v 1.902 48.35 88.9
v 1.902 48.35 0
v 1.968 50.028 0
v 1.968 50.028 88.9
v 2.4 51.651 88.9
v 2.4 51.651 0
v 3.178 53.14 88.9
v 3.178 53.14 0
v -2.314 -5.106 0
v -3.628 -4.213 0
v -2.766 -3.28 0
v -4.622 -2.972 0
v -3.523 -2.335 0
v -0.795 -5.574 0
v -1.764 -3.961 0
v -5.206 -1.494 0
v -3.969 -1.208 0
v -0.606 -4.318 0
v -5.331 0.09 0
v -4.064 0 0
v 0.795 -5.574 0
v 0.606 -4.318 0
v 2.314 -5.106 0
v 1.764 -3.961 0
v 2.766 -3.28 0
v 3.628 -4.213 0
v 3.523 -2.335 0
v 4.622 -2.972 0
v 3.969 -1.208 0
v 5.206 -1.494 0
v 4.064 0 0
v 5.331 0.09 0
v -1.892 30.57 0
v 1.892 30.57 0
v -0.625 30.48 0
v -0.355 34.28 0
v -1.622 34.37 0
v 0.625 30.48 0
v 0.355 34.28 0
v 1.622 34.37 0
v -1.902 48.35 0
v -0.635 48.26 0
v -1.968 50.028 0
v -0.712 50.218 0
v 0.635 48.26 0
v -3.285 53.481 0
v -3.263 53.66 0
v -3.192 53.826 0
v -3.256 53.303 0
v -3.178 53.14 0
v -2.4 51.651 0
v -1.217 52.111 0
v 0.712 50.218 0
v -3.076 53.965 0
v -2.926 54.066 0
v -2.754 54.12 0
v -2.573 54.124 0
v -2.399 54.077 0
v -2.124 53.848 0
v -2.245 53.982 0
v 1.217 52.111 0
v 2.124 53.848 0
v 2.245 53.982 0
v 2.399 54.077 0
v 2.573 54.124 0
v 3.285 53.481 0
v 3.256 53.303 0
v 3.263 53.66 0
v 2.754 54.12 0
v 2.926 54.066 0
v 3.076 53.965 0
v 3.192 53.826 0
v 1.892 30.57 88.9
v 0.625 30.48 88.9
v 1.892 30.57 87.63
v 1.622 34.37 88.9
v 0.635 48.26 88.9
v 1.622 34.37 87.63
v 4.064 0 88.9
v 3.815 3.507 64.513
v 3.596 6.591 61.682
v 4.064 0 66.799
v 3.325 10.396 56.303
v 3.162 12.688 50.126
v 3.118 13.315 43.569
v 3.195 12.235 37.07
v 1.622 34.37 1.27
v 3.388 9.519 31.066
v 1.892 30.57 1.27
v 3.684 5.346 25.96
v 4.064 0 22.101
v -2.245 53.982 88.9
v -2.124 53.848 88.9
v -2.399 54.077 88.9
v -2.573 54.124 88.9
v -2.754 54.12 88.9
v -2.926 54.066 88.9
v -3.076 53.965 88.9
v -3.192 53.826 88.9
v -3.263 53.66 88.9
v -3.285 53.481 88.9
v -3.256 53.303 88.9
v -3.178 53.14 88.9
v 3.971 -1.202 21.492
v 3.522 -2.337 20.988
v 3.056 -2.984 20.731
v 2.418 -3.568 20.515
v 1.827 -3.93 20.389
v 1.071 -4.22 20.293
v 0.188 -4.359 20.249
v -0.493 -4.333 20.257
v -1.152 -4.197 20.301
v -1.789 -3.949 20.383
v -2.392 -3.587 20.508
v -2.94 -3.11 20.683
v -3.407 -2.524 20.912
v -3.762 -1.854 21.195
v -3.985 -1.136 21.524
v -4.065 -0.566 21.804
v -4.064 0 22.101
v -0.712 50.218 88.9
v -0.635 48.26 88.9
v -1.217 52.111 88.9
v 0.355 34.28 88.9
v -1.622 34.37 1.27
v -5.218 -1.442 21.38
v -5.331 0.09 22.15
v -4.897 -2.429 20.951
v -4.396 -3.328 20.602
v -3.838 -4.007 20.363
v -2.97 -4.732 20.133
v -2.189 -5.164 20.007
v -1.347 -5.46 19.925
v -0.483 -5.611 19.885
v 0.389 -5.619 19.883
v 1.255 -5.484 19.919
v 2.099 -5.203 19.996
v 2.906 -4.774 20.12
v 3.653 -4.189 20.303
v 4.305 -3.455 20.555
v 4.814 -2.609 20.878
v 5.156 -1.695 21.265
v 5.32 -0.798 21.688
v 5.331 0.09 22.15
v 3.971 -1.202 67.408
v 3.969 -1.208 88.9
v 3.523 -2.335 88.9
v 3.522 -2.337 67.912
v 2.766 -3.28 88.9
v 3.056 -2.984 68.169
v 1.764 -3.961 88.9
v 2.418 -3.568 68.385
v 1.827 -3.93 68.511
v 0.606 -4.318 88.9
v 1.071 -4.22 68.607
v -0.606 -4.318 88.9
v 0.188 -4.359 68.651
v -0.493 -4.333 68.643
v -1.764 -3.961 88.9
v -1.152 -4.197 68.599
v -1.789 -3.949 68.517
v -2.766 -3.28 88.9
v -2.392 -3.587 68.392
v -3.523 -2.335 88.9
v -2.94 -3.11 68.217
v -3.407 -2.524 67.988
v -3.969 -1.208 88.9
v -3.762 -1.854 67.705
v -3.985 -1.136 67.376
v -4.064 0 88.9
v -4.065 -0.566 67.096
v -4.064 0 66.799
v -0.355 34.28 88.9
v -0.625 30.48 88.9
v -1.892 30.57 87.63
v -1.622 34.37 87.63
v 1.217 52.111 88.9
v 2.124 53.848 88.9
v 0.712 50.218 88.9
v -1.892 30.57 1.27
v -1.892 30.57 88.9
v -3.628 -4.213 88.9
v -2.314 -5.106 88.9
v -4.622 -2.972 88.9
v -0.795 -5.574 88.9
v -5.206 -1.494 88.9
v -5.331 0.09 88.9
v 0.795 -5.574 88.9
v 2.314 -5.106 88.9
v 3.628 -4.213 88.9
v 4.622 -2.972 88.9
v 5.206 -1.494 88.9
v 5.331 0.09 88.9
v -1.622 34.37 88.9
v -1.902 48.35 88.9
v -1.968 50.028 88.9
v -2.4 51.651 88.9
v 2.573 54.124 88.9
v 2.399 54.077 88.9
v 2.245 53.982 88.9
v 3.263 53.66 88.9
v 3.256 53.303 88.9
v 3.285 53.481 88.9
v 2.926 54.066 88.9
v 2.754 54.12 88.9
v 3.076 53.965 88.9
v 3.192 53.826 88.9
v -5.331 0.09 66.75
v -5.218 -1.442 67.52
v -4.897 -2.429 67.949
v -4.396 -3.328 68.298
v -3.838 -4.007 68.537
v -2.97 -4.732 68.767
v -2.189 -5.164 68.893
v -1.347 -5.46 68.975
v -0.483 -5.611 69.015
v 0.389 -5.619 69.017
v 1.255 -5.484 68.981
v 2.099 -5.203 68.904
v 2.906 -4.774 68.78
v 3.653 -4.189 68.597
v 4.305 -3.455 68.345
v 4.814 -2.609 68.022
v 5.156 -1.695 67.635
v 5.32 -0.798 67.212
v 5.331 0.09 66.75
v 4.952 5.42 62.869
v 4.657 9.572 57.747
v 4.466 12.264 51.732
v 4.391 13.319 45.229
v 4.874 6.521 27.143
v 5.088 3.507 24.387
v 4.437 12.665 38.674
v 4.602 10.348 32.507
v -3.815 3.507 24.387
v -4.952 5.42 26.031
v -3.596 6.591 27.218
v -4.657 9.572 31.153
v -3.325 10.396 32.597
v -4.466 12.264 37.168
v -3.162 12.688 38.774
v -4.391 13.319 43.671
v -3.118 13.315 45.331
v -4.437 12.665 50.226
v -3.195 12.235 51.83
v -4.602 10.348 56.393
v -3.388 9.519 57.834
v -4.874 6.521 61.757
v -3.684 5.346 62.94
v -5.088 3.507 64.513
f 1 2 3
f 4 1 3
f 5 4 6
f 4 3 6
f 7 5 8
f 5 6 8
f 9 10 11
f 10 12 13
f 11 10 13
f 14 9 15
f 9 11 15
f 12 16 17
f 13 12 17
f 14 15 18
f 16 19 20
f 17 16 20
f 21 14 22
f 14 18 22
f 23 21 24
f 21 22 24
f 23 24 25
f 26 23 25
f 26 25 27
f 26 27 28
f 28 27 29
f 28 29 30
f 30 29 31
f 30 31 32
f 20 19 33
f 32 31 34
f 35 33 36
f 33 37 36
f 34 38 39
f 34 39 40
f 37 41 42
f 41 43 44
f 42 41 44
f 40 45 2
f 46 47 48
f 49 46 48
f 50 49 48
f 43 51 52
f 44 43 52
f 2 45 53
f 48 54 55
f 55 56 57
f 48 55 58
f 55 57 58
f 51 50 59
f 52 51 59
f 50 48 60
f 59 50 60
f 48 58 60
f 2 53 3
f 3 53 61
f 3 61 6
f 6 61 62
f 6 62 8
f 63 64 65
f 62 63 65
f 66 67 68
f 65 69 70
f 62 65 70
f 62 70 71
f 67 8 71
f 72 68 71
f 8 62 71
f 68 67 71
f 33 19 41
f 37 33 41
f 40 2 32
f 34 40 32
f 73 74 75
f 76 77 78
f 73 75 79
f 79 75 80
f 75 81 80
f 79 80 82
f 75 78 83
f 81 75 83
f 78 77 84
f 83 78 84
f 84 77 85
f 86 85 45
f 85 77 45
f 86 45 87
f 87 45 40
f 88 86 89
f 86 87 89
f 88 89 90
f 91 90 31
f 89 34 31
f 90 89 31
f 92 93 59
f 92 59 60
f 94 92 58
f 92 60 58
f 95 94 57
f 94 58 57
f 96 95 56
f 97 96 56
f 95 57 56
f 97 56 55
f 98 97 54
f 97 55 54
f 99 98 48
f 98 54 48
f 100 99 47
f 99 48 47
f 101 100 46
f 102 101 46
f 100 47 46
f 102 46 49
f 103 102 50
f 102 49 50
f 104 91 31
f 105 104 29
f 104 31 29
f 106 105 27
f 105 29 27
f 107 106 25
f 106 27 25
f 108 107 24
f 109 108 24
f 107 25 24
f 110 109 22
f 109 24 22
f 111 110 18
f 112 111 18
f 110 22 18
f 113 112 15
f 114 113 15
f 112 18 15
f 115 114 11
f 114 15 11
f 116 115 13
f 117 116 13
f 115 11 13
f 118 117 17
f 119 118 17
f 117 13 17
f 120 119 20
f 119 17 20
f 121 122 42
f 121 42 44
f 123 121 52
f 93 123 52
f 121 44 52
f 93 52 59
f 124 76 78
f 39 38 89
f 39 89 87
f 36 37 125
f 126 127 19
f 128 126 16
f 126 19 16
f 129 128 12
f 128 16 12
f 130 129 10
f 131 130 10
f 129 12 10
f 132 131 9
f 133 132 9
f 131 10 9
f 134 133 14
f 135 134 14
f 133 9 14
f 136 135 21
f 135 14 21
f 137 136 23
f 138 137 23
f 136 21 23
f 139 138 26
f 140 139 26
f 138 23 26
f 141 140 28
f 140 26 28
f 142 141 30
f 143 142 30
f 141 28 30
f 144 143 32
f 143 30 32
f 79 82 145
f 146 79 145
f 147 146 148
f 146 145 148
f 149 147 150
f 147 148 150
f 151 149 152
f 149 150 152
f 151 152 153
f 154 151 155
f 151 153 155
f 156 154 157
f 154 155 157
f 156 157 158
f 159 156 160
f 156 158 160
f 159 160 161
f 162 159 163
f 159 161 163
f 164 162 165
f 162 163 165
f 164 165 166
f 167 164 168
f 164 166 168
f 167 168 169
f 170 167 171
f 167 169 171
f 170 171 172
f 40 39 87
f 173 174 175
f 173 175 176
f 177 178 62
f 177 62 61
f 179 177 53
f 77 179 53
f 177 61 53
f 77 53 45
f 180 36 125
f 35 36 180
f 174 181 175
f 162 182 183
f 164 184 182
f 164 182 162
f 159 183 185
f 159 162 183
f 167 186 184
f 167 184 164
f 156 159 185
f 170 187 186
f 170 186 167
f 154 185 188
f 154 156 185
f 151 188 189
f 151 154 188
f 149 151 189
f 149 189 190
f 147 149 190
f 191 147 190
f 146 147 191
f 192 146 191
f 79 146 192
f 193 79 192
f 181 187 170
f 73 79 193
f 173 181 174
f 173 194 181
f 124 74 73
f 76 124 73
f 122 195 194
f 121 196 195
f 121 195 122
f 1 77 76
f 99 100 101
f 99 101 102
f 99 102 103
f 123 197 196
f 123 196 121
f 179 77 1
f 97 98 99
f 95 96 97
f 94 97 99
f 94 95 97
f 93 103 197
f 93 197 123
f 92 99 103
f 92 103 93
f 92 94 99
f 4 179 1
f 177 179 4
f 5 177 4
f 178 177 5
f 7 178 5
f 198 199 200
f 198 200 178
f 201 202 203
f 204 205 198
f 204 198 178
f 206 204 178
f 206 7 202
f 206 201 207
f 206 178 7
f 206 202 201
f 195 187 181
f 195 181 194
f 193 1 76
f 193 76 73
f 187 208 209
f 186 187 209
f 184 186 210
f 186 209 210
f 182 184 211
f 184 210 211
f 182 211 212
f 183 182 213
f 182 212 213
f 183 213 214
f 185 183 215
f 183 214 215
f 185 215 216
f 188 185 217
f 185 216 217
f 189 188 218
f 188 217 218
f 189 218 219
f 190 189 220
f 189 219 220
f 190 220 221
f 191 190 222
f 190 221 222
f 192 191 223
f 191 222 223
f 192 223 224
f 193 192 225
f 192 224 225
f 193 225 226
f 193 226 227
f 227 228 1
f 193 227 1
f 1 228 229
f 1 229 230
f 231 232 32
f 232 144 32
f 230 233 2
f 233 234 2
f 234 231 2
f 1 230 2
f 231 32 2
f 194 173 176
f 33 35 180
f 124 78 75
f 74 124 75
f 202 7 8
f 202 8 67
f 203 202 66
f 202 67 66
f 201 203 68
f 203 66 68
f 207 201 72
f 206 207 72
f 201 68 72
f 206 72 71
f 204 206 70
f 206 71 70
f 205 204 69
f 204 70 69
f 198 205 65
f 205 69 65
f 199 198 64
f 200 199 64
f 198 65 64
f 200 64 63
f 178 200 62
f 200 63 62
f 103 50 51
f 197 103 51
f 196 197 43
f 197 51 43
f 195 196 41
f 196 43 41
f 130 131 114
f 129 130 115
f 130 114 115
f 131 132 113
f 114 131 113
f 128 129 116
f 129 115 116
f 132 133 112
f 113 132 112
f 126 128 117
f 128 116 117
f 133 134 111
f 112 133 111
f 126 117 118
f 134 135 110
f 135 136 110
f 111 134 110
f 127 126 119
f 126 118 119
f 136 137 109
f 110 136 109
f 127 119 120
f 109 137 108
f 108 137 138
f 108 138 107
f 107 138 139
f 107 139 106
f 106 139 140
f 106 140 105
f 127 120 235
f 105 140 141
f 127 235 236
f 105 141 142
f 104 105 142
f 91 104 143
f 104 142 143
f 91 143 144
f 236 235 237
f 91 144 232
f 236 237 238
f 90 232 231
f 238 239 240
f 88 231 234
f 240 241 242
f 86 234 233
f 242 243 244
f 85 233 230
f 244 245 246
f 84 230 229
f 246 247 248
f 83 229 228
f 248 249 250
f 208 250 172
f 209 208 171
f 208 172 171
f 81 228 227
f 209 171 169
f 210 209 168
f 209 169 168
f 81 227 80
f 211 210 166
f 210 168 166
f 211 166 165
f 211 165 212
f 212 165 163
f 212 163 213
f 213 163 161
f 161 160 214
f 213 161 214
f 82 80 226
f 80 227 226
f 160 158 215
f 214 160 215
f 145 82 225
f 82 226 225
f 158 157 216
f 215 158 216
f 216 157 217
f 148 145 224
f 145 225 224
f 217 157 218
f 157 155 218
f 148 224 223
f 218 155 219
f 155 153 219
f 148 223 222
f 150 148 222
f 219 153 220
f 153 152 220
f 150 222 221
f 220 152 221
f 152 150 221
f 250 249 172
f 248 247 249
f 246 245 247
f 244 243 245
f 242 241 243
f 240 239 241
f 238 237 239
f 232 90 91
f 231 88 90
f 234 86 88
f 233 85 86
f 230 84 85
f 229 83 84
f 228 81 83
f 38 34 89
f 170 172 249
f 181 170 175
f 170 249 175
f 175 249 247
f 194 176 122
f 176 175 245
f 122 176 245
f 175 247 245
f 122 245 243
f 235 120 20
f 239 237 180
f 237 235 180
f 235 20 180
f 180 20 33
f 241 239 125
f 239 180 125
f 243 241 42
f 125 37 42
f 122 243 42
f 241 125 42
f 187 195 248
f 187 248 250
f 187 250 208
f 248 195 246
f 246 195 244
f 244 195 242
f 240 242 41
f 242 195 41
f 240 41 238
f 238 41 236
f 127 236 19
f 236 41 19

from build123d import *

# Parameters (mm, degrees)
F1_DEPTH = 88.9
F3_DEPTH = 1.27
F5_DEPTH = 1.27
F6_SIZE  = 1.26999
F8_DEPTH = 12.7


# Not quite as in the source:
# - a fillet or chamfer is up to 0.001 mm smaller than in the source, because OpenCascade refuses the exact size


with BuildPart() as f1:
    # F0 (on Top) → F1 (new body)
    with BuildSketch(Plane.XY):
        with BuildLine():
            Line((-4.064, 0), (-0.635, 48.26))
            ThreePointArc((-0.635, 48.26), (-0.9122099758, 51.1784184141), (-2.1235503767, 53.848))
            ThreePointArc((-2.1235503767, 53.848), (-3.0047663986, 54.0209402292), (-3.1777066278, 53.1397242074))
            ThreePointArc((-3.1777066278, 53.1397242074), (-2.1394148555, 50.8515114195), (-1.9018063048, 48.3500099217))
            Line((-1.9018063048, 48.3500099217), (-5.3308063048, 0.0900099217))
            ThreePointArc((-5.3308063048, 0.0900099217), (0, -5.633003484), (5.3308063048, 0.0900099217))
            Line((5.3308063048, 0.0900099217), (1.9018063048, 48.3500099217))
            ThreePointArc((1.9018063048, 48.3500099217), (2.1394148555, 50.8515114195), (3.1777066278, 53.1397242074))
            ThreePointArc((3.1777066278, 53.1397242074), (3.0047663986, 54.0209402292), (2.1235503767, 53.848))
            ThreePointArc((2.1235503767, 53.848), (0.9122099758, 51.1784184141), (0.635, 48.26))
            Line((0.635, 48.26), (4.064, 0))
            ThreePointArc((4.064, 0), (0, -4.363003484), (-4.064, 0))
        make_face()
    extrude(amount=F1_DEPTH)

    # F2 (on face) → F3 (join)
    with BuildSketch(Plane.XY.offset(88.9)):
        Polygon((-0.3550842778, 34.2804189145), (-1.6218905827, 34.3704288362), (-1.8919203477, 30.5700099217), (-0.6251140428, 30.48), align=None)
        Polygon((0.6251140428, 30.48), (1.8919203477, 30.5700099217), (1.6218905827, 34.3704288362), (0.3550842778, 34.2804189145), align=None)
    extrude(amount=-F3_DEPTH)

    # F4 (on face) → F5 (join)
    with BuildSketch(Plane(origin=(0, 0, 0), x_dir=(1, 0, 0), z_dir=(0, 0, -1))):
        Polygon((-0.6251140428, -30.48), (-1.8919203477, -30.5700099217), (-1.6218905827, -34.3704288362), (-0.3550842778, -34.2804189145), align=None)
        Polygon((1.6218905827, -34.3704288362), (1.8919203477, -30.5700099217), (0.6251140428, -30.48), (0.3550842778, -34.2804189145), align=None)
    extrude(amount=-F5_DEPTH)

    # F6 (size 1.27 in the source; OpenCascade refuses exactly that, so slightly less here)
    f6_edges = [f1.edges().sort_by_distance(p)[0] for p in [
        (-0.490099, 32.380209, 1.27),
        (0.490099, 32.380209, 1.27),
        (-0.490099, 32.380209, 87.63),
        (0.490099, 32.380209, 87.63),
    ]]
    chamfer(f6_edges, length=F6_SIZE)

    # F7 (on Right) → F8 (cut, symmetric)
    with BuildSketch(Plane.YZ):
        with BuildLine():
            ThreePointArc((-5.842, 19.8251978841), (13.3307116053, 44.45), (-5.842, 69.0748021159))
            Line((-5.842, 69.0748021159), (-5.842, 19.8251978841))
        make_face()
    extrude(amount=F8_DEPTH, both=True, mode=Mode.SUBTRACT)


solid = f1.part
